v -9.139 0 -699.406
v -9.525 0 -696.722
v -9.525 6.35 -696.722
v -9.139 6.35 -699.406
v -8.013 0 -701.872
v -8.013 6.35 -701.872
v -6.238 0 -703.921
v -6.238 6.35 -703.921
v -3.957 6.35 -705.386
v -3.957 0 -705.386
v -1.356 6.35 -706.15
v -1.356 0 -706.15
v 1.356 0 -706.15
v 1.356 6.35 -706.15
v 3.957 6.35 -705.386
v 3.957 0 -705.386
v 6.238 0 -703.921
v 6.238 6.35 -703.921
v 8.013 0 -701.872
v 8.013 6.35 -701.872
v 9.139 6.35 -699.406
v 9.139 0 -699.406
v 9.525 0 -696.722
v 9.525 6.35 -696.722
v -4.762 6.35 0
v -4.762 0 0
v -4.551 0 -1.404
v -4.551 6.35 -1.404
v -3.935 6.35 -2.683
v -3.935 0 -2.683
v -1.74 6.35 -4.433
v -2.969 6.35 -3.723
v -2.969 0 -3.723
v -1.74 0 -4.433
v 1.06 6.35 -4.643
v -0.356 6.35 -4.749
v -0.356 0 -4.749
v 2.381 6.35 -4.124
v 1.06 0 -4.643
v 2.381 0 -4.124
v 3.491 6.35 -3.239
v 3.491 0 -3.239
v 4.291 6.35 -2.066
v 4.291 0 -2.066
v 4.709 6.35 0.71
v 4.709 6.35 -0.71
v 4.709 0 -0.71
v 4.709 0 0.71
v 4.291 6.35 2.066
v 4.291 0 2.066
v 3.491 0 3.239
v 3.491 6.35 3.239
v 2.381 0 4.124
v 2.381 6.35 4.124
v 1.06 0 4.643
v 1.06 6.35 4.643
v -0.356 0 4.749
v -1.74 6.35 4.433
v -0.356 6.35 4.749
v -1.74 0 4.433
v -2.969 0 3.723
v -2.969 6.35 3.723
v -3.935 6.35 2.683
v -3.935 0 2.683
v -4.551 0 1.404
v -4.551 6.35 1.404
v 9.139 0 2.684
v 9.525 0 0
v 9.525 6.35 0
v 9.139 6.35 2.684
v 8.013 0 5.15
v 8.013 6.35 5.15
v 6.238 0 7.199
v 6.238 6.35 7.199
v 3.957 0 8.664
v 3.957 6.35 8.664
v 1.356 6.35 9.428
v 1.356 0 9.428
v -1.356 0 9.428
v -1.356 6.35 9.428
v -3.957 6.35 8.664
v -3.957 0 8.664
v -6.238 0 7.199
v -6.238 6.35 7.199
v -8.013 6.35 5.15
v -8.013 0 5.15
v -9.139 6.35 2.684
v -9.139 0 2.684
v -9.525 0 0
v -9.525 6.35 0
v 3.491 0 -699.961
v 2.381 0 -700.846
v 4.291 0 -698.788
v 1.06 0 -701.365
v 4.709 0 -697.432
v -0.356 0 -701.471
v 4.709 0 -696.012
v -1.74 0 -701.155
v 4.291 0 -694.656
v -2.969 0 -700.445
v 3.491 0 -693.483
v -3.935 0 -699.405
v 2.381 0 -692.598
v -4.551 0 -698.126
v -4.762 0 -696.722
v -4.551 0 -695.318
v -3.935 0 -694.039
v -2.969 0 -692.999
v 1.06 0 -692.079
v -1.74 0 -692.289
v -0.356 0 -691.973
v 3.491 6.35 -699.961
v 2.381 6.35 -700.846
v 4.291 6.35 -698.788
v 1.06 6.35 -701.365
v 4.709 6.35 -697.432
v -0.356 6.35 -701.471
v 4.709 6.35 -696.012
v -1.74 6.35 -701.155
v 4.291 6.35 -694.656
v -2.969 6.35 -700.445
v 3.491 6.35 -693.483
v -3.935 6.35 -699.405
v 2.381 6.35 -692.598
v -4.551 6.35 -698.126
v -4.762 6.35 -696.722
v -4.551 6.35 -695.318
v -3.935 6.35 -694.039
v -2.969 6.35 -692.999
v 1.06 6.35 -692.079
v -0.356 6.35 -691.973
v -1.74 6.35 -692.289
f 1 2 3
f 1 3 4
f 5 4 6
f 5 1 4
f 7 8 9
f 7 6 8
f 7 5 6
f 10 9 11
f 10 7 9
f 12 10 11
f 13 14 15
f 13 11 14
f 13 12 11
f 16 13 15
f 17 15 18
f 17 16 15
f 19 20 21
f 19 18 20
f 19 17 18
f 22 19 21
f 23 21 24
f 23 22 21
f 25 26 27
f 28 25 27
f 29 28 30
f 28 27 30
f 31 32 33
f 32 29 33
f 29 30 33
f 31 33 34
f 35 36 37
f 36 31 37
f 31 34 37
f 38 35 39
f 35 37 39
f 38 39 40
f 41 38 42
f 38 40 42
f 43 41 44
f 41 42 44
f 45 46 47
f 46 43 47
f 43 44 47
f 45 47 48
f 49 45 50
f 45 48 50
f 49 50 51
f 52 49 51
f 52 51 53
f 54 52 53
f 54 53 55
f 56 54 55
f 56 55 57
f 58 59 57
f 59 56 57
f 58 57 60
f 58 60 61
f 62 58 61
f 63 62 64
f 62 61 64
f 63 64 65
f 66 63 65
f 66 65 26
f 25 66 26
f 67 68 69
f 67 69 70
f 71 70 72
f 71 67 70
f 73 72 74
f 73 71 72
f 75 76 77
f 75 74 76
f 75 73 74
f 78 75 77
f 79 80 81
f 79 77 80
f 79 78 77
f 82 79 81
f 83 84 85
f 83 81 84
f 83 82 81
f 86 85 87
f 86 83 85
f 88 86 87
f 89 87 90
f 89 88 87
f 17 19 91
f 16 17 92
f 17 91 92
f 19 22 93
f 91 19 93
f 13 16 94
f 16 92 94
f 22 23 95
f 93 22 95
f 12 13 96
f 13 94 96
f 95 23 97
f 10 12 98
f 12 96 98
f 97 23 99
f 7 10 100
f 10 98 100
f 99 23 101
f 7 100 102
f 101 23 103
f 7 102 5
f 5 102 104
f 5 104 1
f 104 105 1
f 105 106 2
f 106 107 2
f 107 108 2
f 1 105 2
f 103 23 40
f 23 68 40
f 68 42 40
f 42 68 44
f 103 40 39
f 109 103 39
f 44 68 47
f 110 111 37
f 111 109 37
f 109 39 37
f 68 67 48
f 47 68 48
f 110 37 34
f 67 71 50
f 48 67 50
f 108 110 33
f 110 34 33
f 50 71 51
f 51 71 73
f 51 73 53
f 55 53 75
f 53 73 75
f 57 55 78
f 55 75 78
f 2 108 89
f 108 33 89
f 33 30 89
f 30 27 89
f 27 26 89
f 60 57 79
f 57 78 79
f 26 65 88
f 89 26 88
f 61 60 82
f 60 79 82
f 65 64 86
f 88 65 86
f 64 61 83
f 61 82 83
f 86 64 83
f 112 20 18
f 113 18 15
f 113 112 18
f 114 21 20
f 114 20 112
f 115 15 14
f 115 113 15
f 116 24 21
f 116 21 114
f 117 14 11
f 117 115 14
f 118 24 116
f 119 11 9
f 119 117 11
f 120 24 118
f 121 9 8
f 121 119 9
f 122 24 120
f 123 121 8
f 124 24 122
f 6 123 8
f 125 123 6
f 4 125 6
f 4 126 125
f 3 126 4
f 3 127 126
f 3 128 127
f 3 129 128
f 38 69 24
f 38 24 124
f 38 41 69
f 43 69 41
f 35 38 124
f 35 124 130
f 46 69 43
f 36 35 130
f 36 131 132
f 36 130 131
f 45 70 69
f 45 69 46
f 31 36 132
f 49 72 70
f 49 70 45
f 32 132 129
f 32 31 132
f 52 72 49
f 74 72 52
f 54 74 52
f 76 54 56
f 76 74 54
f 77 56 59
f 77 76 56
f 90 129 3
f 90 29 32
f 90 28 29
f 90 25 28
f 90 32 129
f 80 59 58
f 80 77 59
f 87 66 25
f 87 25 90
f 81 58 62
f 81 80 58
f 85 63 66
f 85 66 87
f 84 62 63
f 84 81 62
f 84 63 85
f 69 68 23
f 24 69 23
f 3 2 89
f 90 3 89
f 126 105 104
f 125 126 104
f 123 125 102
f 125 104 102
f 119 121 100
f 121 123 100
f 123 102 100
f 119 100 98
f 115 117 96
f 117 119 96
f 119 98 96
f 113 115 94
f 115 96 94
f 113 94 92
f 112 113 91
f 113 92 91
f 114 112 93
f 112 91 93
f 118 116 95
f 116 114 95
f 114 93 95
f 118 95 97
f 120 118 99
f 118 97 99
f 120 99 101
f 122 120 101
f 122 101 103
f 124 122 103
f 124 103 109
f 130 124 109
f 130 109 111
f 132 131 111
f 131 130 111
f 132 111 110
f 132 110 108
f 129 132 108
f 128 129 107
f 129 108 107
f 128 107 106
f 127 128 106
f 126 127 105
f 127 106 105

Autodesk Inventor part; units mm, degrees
ref_plane "YZ Plane" through (0, 0, 0) normal (1, 0, 0) x (0, 1, 0)
ref_plane "XZ Plane" through (0, 0, 0) normal (0, 1, 0) x (-1, 0, 0)
ref_plane "XY Plane" through (0, 0, 0) normal (0, 0, 1) x (1, 0, 0)
sketch "Sketch1" plane through (0, 0, 0) normal (0, 1, 0) x (-1, 0, 0)
  arc A0 (9.525, 0) -> (0, -9.525) centre (0, 0) ccw
  line L0 (0, 0) -> (0, -696.722) construction
  arc A1 (0, -687.197) -> (9.525, -696.722) centre (0, -696.722) ccw
  line L1 (9.525, -696.722) -> (9.525, 0)
  line L2 (-9.525, 0) -> (-9.525, -696.722)
  circle A2 centre (0, -696.722) radius 4.7625
  circle A3 centre (0, 0) radius 4.7625
  dimension "d0" = 19.05
  dimension "d2" = 19.05
  dimension "d3" = 9.525
  dimension "d4" = 9.525
  dimension "d10" = 696.722
extrude "Extrusion2" add sketch "Sketch1" along normal blind 6.35
properties part number "steeringlinkage" material "Steel, Mild"
